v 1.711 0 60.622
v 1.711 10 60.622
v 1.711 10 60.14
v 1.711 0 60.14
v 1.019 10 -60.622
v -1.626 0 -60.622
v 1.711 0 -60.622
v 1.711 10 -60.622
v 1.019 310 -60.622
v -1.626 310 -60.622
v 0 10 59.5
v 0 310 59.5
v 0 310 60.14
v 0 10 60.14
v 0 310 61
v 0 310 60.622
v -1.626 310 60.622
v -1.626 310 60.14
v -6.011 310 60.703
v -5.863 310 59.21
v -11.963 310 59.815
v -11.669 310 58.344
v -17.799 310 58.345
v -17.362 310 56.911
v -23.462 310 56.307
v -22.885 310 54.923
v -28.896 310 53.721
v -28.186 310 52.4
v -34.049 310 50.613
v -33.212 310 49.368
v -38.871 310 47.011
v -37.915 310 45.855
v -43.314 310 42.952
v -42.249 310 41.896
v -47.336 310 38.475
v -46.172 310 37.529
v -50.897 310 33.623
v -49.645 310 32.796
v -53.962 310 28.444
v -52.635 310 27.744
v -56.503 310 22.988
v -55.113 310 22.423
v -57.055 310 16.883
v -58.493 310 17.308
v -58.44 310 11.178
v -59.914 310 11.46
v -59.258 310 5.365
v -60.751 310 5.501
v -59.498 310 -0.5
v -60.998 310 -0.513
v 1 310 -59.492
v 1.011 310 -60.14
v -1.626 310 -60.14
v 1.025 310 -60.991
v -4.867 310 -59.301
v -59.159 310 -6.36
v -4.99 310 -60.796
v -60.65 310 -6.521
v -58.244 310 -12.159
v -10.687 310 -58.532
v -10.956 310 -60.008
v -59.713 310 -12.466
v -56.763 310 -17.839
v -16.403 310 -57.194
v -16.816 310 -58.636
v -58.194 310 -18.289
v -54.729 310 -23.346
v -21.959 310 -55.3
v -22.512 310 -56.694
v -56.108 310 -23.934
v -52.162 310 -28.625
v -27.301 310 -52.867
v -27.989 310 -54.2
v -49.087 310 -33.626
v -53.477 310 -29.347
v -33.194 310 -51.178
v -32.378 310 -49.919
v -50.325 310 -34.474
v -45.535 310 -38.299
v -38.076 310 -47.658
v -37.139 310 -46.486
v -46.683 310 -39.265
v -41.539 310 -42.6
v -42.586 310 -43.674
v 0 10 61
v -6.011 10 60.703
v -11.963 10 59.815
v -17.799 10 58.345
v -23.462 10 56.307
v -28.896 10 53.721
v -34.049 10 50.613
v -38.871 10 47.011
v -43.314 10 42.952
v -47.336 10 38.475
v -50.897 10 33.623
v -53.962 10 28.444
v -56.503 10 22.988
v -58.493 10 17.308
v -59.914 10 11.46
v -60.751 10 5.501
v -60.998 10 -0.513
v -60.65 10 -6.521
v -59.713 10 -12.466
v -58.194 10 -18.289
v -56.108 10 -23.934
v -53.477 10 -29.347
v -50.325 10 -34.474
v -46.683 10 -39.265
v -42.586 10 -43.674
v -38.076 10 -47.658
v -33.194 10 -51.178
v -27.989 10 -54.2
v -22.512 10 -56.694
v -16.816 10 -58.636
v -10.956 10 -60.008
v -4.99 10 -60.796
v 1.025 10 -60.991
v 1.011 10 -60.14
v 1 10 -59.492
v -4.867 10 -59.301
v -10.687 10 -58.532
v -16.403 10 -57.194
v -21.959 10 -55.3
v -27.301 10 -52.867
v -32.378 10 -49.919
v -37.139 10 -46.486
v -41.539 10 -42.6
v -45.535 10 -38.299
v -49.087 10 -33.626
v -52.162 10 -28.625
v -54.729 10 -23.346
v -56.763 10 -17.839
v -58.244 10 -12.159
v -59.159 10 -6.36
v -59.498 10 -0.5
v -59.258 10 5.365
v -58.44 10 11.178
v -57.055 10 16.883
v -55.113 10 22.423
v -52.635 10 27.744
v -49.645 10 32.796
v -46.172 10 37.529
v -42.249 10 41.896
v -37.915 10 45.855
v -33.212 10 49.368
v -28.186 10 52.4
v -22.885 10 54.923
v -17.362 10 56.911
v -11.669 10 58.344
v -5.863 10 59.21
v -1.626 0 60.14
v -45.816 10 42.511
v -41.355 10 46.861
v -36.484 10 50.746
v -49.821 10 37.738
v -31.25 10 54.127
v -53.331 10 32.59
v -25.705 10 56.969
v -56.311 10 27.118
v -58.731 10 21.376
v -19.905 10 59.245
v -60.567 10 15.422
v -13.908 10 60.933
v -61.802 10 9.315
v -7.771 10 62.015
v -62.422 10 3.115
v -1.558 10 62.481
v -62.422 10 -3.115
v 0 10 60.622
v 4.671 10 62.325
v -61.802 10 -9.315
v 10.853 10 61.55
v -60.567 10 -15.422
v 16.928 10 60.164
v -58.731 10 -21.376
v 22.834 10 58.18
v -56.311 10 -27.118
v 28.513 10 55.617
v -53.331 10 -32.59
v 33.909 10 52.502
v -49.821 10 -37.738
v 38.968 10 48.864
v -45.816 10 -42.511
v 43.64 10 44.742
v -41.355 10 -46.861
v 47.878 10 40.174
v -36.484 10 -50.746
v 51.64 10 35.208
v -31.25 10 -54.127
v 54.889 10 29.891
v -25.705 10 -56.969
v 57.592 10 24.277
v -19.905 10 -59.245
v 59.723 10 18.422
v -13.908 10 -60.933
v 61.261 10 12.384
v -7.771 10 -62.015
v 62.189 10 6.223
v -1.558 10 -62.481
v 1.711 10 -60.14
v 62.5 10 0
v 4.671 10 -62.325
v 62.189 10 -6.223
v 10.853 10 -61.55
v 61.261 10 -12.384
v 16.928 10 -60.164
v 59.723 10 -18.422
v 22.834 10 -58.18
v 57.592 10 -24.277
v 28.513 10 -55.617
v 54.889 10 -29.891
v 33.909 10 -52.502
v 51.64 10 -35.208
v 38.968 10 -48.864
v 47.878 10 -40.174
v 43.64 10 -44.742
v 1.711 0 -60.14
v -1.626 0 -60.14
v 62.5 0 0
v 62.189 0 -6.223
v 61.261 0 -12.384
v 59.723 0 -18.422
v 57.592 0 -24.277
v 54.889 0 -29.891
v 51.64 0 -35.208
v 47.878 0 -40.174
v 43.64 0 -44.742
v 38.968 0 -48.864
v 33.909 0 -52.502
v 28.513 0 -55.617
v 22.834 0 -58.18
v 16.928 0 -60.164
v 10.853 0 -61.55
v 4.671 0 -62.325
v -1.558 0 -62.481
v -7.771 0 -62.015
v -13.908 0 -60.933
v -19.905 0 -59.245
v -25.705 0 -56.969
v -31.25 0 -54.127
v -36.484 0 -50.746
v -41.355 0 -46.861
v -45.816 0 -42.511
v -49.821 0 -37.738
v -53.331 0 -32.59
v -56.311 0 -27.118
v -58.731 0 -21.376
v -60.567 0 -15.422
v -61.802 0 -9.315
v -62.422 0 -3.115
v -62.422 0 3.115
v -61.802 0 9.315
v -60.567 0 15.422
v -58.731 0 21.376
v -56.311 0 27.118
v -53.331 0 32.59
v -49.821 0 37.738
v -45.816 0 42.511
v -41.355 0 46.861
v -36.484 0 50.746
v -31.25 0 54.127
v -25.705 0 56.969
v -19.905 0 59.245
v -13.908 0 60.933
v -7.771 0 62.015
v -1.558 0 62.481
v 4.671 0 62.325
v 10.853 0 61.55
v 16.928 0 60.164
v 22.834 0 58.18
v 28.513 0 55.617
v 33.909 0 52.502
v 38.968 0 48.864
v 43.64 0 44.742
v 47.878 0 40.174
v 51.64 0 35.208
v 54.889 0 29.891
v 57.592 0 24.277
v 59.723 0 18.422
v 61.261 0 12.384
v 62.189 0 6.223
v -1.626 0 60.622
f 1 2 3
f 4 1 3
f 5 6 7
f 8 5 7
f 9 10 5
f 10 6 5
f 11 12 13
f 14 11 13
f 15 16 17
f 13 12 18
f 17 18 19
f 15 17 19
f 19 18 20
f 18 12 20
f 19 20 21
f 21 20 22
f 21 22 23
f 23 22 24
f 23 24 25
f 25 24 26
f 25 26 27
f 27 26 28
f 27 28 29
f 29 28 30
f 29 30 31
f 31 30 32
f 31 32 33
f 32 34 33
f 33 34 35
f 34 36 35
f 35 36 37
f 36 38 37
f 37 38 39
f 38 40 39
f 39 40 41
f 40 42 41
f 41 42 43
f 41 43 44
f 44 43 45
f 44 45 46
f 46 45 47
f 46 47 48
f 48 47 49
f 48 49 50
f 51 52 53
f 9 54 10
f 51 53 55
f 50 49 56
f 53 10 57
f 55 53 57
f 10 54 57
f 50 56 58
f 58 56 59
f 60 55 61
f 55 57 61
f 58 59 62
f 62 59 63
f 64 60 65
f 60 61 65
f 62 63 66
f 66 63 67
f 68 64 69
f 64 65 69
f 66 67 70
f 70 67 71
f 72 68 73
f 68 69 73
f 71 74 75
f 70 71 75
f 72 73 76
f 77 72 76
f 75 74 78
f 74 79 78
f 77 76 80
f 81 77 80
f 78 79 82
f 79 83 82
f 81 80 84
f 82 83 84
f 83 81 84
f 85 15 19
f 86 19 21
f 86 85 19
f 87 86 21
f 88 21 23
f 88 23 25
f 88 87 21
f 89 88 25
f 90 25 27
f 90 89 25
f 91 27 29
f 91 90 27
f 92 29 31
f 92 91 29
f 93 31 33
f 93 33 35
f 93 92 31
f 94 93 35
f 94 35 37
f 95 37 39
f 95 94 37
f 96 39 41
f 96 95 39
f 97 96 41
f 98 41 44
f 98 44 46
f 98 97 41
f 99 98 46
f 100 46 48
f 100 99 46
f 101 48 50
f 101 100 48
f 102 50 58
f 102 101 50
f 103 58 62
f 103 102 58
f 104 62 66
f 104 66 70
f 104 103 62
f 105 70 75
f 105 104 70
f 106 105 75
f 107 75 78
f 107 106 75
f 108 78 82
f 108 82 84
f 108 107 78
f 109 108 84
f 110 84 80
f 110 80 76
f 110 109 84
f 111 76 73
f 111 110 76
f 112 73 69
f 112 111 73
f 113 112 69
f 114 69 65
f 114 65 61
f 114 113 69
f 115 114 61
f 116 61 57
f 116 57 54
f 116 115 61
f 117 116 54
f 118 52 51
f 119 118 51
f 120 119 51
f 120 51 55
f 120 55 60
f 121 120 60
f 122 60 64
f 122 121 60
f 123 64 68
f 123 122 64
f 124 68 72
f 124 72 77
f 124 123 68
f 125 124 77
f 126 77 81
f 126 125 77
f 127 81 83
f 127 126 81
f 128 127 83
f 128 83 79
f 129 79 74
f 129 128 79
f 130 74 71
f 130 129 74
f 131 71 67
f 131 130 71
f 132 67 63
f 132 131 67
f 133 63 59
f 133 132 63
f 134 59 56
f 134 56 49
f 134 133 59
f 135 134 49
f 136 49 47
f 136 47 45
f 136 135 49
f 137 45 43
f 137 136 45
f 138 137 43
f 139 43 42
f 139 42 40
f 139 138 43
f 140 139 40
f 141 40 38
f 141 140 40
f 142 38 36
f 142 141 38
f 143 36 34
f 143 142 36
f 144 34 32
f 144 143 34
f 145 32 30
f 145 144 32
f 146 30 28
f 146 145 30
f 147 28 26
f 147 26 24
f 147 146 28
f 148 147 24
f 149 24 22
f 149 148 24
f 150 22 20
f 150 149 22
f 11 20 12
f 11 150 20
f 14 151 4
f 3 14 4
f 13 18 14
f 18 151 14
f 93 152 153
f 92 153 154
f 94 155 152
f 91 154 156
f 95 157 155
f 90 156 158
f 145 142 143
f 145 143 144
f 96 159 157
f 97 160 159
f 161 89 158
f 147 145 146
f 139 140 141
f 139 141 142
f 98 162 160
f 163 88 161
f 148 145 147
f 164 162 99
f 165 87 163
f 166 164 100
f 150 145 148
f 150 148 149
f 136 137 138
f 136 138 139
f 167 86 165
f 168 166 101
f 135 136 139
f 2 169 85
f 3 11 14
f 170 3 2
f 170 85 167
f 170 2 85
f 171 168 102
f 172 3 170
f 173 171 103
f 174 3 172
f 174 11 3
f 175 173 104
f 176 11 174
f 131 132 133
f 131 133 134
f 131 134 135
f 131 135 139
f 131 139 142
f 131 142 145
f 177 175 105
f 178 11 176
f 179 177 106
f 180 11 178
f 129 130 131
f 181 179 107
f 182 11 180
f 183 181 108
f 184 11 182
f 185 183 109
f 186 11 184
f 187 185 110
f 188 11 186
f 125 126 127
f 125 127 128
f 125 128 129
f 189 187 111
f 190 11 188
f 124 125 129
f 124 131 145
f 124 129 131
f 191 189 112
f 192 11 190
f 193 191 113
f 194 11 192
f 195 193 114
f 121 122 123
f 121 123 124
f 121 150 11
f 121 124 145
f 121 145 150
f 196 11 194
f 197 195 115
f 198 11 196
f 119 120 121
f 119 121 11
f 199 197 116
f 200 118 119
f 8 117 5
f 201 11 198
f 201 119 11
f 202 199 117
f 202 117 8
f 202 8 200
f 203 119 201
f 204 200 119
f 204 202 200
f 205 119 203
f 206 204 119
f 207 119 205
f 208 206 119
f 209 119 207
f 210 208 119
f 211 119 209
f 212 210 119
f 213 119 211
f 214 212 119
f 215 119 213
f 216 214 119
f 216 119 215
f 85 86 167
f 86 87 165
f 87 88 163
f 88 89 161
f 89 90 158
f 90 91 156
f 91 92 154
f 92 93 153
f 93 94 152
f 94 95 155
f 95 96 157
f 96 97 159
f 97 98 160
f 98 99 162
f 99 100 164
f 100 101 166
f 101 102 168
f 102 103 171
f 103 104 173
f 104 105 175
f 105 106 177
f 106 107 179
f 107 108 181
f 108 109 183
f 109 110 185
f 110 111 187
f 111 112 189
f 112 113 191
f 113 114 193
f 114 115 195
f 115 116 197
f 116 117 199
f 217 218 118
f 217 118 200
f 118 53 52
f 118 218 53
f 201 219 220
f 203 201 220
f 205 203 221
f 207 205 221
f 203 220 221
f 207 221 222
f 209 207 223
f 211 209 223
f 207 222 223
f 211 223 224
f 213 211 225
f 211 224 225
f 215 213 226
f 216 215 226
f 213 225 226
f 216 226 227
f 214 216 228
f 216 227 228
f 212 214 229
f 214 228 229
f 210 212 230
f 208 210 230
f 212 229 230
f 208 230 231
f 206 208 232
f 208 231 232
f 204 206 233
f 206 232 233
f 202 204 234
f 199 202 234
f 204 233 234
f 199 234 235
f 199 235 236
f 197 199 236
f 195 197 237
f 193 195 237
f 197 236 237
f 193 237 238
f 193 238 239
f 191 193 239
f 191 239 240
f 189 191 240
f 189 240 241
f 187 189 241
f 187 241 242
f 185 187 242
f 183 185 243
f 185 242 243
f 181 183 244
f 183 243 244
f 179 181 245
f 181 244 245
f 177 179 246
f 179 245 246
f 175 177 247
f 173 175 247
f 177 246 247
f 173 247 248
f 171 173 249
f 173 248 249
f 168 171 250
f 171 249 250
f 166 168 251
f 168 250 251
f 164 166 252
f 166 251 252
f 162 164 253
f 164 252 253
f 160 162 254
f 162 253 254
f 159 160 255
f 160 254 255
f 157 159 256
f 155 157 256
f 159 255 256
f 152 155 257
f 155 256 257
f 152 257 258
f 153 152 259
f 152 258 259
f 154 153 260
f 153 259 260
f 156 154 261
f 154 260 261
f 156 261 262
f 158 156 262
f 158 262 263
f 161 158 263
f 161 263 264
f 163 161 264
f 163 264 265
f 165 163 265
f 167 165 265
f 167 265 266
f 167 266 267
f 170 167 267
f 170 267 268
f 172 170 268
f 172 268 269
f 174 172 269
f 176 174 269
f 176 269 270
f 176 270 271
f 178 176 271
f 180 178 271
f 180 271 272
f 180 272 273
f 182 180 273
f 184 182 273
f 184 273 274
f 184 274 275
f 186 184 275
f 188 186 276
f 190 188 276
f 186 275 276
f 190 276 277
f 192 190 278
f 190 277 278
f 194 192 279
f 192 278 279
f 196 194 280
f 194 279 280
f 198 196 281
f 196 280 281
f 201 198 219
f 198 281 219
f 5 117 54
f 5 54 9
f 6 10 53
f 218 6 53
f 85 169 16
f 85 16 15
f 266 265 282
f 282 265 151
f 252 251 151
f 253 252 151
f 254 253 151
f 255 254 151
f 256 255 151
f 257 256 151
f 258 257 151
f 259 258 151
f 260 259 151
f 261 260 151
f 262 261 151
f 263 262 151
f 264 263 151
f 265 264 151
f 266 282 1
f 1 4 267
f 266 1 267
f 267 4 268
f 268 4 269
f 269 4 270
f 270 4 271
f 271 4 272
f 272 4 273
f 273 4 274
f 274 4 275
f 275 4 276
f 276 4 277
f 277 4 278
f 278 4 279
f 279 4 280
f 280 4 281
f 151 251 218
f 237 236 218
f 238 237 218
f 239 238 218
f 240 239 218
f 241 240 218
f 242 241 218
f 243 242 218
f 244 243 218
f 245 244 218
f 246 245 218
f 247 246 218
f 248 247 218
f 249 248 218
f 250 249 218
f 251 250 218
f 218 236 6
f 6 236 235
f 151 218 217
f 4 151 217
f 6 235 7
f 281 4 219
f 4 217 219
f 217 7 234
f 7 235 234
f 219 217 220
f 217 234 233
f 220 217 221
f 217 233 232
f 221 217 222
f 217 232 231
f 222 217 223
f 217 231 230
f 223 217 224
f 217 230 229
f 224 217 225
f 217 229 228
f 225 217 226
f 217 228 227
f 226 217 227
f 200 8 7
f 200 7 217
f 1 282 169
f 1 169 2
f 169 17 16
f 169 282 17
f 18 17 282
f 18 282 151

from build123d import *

# Parameters (mm, degrees)
SKETCH1_R           = 62.5
BOSS_EXTRUDE2_DEPTH = 10
EXTRUDE_THIN1_DEPTH = 300
SKETCH8_W           = 3.337239336
SKETCH8_H           = 0.481982953
CUT_EXTRUDE1_DEPTH  = 311


with BuildPart() as part:
    # Sketch1 → Boss-Extrude2 (new body)
    with BuildSketch(Plane(origin=(0, 0, 0), x_dir=(1, 0, 0), z_dir=(0, 1, 0))):
        Circle(SKETCH1_R)
    extrude(amount=BOSS_EXTRUDE2_DEPTH)

    # Sketch4 → Extrude-Thin1 (add)
    with BuildSketch(Plane(origin=(0, 10, 0), x_dir=(1, 0, 0), z_dir=(0, 1, 0))):
        with BuildLine():
            ThreePointArc((0.99996418, 59.491596647), (-59.497899125, 0.499999744), (0, -59.5))
            Line((0, -59.5), (0, -61))
            ThreePointArc((0, -61), (-60.997846161, 0.51260478), (1.025173361, 60.991384798))
            Line((1.025173361, 60.991384798), (0.99996418, 59.491596647))
        make_face()
    extrude(amount=EXTRUDE_THIN1_DEPTH)

    # Sketch8 → Cut-Extrude1 (cut, through all)
    with BuildSketch(Plane(origin=(0, 310, 0), x_dir=(1, 0, 0), z_dir=(0, 1, 0))):
        with Locations((0.042875515, -60.380737202)):
            Rectangle(SKETCH8_W, SKETCH8_H)
    cut_extrude1 = extrude(amount=-CUT_EXTRUDE1_DEPTH, mode=Mode.SUBTRACT)

    # Mirror1: Cut-Extrude1 across plane
    add(cut_extrude1.mirror(Plane.XY), mode=Mode.SUBTRACT)


solid = part.part
